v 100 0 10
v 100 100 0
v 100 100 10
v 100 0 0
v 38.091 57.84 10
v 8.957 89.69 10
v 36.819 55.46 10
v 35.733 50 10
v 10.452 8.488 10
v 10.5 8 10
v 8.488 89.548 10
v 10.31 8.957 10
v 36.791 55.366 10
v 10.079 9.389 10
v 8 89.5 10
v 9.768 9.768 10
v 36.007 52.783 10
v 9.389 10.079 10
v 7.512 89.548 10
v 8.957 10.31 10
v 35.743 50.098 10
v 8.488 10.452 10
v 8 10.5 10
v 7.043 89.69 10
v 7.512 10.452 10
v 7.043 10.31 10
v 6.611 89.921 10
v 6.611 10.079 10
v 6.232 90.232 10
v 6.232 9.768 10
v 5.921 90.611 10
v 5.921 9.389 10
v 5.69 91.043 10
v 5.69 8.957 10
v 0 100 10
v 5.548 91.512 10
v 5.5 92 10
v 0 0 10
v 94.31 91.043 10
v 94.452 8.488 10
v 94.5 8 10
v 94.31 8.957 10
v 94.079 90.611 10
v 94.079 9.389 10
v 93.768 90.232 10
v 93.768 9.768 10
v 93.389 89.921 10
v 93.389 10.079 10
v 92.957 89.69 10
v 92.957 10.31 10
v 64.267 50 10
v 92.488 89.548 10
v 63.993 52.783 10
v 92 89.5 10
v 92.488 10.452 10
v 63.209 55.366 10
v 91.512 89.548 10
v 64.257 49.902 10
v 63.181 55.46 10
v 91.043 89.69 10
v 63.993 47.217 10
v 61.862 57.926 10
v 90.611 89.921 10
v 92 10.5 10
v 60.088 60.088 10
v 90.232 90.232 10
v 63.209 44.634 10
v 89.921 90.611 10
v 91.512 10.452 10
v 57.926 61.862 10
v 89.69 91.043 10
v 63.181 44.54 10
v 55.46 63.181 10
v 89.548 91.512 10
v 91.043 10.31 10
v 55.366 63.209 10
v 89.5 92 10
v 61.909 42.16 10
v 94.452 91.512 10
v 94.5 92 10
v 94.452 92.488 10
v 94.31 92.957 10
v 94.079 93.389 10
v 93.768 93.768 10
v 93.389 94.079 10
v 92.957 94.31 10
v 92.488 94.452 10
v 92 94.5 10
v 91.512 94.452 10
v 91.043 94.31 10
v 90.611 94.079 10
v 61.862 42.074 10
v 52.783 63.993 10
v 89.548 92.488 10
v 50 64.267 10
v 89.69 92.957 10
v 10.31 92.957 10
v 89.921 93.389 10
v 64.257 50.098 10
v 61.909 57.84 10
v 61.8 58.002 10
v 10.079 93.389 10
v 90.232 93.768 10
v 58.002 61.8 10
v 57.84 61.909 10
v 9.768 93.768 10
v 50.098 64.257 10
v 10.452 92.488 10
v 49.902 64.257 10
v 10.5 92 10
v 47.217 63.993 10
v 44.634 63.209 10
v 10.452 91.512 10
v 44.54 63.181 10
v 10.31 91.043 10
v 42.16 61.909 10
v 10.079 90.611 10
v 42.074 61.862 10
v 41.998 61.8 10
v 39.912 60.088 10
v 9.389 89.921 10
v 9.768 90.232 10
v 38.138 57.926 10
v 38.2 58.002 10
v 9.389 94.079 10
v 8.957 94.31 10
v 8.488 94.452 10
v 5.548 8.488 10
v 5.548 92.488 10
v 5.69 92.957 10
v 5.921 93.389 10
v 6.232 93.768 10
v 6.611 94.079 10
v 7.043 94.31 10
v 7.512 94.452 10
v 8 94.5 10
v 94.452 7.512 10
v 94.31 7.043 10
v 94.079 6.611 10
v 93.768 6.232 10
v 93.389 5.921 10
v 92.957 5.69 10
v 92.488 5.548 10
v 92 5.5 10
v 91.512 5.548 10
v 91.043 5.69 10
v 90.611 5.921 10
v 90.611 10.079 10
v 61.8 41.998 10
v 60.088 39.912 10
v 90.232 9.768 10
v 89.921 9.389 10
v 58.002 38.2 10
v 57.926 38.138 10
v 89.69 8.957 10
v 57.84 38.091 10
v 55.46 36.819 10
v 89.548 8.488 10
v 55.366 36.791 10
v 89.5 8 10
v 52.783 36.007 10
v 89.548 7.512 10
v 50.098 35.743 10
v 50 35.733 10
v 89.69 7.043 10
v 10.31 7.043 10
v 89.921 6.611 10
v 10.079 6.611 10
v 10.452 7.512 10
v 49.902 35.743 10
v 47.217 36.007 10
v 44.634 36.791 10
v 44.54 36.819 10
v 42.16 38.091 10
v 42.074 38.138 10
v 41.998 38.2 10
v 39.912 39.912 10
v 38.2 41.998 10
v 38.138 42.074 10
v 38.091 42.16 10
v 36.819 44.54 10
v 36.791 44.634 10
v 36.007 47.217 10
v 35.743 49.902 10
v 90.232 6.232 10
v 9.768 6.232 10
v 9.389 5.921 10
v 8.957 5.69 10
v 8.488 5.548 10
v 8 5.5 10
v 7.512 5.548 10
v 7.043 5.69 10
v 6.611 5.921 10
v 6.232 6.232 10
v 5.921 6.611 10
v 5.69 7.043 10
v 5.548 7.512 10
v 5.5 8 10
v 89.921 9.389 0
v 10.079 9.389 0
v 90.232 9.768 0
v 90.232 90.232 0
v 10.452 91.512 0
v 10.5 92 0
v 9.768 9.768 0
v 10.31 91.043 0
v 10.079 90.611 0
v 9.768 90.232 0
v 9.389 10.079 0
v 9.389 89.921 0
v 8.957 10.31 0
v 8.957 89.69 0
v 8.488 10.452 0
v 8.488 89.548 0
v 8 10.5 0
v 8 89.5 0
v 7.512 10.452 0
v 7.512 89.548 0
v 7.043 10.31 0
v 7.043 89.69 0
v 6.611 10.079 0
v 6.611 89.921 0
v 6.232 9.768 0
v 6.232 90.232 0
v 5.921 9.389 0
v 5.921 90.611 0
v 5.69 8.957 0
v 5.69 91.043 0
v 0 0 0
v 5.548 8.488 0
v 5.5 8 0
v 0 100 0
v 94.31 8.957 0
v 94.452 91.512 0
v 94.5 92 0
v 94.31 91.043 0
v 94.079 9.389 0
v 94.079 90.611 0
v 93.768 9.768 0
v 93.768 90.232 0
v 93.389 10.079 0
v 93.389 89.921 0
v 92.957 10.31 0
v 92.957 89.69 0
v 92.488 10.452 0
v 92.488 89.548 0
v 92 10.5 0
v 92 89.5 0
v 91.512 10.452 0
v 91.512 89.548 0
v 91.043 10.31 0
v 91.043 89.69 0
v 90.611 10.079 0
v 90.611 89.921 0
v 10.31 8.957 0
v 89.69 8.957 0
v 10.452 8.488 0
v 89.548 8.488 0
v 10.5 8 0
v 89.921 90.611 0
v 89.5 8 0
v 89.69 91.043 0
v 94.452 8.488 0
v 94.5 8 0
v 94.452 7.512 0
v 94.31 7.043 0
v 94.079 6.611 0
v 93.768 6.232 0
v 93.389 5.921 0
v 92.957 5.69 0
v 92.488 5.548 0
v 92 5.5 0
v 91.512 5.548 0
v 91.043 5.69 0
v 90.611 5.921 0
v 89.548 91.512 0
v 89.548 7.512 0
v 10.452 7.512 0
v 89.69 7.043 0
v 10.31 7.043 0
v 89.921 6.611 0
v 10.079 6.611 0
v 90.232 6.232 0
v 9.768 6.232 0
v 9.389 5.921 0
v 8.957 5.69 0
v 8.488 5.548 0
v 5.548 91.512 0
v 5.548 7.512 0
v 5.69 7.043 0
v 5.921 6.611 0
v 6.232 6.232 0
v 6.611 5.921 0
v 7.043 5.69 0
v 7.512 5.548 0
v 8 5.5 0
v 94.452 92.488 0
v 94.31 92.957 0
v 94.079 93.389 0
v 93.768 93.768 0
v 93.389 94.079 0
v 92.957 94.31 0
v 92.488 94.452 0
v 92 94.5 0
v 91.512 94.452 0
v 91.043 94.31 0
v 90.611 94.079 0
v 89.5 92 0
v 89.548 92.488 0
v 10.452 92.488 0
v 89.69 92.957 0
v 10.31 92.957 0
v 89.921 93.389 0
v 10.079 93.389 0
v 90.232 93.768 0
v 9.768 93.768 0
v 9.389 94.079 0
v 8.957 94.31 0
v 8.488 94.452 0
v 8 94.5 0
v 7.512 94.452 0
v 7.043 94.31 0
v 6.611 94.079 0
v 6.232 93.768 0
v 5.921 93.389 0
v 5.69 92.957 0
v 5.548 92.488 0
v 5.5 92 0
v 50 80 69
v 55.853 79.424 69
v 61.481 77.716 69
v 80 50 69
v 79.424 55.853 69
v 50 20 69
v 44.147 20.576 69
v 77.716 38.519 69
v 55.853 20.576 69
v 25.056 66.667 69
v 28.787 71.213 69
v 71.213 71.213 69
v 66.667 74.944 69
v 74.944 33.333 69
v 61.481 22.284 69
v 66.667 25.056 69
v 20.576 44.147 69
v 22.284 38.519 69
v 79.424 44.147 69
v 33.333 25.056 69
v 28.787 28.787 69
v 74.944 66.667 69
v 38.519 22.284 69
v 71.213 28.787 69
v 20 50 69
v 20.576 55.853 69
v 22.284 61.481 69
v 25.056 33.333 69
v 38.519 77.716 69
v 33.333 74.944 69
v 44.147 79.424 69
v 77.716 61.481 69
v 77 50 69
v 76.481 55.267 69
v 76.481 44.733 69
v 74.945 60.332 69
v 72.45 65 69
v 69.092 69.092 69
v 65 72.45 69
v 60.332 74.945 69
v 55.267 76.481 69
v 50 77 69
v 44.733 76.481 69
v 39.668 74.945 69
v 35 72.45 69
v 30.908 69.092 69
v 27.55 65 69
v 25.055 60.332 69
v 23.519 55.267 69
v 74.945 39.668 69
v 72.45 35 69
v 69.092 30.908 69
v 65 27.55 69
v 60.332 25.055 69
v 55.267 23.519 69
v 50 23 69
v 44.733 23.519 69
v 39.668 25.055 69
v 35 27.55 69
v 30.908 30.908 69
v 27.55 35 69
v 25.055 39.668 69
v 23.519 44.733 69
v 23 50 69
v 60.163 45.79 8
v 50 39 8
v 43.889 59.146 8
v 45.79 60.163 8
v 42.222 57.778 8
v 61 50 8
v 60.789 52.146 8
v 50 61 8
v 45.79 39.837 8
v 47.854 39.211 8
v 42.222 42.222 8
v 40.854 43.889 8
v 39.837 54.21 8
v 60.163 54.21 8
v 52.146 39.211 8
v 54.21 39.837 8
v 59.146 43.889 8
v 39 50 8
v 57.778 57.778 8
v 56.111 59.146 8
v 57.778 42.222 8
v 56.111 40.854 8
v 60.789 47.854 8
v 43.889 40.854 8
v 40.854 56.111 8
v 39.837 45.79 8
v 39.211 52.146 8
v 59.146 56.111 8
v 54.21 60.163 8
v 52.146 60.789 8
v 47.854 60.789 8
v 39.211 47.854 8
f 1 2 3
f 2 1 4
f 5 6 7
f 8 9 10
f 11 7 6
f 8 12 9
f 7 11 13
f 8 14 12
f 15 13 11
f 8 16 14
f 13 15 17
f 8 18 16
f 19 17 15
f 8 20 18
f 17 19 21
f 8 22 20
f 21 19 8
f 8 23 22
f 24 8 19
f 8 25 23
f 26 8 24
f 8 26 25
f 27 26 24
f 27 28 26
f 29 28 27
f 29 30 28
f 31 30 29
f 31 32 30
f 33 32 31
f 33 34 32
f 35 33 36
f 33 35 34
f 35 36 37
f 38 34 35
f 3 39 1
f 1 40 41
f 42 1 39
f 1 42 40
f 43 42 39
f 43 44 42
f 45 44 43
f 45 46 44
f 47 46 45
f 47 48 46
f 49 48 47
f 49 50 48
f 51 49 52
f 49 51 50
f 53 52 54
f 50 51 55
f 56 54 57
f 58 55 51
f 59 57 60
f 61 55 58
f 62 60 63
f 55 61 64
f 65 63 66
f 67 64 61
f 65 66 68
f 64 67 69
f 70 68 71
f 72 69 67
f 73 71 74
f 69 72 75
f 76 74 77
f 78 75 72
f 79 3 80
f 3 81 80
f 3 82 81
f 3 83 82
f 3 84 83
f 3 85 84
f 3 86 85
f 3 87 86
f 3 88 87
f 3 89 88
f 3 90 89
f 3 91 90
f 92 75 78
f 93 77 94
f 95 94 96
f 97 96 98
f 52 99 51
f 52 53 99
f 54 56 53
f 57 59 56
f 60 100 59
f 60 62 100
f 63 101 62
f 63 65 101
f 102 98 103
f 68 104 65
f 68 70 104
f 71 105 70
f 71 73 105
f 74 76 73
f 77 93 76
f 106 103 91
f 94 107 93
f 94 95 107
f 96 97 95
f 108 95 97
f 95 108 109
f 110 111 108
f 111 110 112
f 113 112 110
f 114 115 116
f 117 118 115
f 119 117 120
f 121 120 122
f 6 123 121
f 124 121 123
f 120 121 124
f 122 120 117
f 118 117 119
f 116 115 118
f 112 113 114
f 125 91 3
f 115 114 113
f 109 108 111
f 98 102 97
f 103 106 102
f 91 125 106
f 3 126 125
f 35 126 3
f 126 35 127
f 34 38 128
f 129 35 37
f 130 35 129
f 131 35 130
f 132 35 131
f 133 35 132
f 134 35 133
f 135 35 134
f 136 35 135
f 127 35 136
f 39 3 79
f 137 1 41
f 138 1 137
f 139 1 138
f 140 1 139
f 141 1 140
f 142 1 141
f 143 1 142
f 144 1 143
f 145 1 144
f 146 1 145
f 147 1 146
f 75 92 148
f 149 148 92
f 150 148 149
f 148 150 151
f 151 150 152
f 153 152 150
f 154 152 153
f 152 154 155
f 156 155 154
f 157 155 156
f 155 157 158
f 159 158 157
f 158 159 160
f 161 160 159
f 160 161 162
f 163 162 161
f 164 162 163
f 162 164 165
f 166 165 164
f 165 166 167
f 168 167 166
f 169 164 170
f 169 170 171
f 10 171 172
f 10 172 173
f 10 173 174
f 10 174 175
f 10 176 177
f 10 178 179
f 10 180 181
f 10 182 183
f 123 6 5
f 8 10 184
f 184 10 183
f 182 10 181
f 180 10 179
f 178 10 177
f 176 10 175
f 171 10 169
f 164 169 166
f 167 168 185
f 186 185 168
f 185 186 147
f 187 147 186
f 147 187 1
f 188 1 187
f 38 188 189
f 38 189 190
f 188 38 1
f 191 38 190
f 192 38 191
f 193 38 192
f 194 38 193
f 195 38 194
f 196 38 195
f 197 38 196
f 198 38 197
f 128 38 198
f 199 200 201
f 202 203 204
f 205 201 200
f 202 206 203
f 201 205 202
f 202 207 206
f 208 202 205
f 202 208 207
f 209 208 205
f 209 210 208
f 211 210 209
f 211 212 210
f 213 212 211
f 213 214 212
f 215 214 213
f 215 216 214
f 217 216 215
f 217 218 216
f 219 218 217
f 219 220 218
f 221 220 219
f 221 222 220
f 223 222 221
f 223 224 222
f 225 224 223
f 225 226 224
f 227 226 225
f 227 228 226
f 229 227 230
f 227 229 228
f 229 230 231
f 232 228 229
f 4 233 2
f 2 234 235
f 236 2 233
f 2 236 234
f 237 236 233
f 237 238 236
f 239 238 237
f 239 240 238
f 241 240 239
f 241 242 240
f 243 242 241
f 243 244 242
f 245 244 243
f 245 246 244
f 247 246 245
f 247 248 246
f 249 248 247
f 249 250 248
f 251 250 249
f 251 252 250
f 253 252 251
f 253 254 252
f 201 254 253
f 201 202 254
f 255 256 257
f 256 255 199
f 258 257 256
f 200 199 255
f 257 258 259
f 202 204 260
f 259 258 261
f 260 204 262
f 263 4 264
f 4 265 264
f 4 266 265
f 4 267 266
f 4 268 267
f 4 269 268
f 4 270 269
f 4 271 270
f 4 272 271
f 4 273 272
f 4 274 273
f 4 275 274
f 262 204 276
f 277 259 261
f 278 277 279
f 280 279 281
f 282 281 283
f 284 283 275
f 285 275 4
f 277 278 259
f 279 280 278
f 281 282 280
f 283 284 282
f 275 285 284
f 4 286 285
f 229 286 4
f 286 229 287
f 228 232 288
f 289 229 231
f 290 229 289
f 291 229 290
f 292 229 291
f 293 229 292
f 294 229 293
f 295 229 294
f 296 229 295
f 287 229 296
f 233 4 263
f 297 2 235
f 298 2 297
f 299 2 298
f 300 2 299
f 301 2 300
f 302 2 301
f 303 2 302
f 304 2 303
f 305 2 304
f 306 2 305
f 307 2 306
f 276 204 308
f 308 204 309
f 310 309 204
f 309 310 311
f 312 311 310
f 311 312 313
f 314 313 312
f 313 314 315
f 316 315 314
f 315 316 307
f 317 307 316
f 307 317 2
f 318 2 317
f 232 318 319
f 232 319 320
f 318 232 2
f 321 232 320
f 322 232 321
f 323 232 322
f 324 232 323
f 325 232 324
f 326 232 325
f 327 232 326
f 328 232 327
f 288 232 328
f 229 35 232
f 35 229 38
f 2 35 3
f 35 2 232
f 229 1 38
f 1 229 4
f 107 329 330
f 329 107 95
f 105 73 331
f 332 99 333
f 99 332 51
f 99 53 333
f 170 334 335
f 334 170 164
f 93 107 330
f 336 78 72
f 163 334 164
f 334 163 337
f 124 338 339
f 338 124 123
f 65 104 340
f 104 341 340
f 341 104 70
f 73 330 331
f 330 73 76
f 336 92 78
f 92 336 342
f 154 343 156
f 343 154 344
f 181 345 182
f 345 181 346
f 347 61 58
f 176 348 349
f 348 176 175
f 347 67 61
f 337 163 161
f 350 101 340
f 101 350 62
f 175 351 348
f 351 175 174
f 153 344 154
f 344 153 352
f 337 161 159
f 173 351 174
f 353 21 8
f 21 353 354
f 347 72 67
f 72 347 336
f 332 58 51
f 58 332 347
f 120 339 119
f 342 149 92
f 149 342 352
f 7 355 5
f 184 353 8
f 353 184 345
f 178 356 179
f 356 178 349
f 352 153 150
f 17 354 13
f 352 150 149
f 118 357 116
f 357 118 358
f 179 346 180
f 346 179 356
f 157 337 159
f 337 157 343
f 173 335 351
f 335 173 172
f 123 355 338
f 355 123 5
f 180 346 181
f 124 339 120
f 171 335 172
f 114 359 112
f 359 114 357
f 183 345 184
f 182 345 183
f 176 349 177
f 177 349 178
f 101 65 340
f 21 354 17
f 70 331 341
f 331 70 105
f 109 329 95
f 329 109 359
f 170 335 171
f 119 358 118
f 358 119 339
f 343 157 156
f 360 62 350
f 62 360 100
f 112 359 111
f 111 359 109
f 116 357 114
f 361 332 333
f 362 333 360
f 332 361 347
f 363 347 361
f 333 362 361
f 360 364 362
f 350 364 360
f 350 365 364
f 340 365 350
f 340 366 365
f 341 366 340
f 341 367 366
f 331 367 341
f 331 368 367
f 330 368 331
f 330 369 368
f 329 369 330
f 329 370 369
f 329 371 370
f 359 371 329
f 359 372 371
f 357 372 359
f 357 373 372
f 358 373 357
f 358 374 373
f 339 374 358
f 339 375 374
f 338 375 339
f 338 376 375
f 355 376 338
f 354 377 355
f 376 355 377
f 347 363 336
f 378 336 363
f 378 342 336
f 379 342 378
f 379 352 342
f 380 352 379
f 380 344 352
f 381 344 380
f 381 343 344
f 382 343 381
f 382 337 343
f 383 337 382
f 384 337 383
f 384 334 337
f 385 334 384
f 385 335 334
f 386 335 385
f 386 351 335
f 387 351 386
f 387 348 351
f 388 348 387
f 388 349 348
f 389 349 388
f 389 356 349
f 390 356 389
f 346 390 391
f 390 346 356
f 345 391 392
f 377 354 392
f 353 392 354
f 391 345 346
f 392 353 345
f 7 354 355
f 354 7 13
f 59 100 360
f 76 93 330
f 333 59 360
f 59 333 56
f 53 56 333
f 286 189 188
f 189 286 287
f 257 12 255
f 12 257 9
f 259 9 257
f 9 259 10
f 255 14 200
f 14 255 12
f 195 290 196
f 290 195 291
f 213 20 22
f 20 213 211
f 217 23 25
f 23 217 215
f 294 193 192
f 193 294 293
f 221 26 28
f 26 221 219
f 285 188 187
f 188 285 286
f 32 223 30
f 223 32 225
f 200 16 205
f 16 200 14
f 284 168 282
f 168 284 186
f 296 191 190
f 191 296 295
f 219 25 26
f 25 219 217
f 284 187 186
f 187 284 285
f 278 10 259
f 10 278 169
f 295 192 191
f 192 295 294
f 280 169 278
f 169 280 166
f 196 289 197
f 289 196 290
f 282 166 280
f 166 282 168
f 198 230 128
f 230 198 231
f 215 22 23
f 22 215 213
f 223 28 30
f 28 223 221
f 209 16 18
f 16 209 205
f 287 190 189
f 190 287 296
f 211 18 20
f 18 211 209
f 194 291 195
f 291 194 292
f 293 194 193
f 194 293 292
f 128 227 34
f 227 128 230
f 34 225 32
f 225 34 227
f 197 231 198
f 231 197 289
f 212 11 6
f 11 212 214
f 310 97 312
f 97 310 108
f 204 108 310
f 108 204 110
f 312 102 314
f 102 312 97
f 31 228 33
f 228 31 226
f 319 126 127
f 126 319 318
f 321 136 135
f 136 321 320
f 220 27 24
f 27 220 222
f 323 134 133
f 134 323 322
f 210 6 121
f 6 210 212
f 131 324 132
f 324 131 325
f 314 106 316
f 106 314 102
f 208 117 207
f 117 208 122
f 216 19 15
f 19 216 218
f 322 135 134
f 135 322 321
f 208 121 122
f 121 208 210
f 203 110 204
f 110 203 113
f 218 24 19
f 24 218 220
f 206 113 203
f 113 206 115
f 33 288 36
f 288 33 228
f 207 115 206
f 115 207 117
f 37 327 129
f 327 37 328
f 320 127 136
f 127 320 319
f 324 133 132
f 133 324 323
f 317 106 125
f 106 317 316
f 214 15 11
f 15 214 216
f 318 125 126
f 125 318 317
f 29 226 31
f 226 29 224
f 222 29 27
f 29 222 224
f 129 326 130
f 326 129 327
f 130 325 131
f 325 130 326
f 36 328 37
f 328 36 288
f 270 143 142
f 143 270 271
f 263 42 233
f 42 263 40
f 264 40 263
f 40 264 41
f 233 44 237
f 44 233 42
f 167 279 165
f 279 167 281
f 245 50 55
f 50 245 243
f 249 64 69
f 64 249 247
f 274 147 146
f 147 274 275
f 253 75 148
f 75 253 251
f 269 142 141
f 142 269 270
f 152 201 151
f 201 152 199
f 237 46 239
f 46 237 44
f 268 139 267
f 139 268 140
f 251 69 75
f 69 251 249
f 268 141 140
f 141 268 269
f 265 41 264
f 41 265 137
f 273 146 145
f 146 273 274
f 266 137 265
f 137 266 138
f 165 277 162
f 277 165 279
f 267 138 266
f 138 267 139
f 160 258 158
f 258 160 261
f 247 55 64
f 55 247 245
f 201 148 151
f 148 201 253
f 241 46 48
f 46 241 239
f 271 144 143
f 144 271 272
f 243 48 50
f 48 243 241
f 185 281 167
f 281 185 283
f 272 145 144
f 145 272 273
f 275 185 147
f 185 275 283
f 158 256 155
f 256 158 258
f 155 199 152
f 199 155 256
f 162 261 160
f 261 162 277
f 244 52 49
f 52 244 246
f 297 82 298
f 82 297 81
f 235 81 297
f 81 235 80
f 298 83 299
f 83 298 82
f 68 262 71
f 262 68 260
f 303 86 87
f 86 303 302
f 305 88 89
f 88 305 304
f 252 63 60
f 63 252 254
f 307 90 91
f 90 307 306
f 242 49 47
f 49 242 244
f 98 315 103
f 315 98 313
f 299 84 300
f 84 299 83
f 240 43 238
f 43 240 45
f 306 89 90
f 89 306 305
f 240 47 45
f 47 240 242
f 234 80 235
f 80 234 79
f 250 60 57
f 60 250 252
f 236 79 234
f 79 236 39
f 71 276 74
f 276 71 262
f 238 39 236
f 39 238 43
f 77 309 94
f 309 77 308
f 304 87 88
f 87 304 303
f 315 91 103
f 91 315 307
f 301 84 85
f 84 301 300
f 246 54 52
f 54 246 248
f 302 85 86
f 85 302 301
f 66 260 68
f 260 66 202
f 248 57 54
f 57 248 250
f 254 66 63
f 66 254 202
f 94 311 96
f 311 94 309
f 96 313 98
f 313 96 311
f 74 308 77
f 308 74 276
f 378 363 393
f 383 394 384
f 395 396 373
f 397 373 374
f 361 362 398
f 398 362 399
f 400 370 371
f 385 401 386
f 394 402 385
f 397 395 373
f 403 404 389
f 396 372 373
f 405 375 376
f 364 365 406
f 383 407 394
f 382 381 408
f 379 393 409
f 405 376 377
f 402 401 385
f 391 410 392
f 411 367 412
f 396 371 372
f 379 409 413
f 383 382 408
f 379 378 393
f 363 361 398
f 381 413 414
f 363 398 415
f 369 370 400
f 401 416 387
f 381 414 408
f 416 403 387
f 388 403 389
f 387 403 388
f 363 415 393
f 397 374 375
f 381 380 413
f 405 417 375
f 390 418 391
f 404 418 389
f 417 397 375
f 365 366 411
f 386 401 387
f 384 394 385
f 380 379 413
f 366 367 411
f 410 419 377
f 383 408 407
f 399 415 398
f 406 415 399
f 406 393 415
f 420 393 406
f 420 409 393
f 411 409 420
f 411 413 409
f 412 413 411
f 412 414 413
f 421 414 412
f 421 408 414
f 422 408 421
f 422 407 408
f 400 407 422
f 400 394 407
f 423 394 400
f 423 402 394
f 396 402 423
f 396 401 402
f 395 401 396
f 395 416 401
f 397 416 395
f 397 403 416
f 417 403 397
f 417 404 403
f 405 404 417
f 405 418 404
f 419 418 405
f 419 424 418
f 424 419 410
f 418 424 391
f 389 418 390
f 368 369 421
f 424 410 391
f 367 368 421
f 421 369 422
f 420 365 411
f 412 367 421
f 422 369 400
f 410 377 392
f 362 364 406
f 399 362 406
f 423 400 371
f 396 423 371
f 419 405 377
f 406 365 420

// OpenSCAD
$fn = 32;

// ----------------------------------------------------------------------
// Hopper: flanged with square flange
// ----------------------------------------------------------------------

// --- parameters (mm) ---
fl = 100;                 // flange side, X and Y
fl_t = 10;                // flange thickness
cone_h = 60;              // cone height above the flange
top_d = 60;               // cone mouth diameter
bot_d = 28;               // cone spout diameter
wall = 3;                 // cone wall thickness
hole_r = 2.5;             // flange hole radius
hole_in = 8;              // hole inset from the corners

bore_d = bot_d - 2 * wall;  // spout bore diameter
total_h = fl_t + cone_h - 1;  // overall height

difference() {
  union() {
    cube([fl, fl, fl_t]);
    translate([fl / 2, fl / 2, fl_t - 1])
      cylinder(h = cone_h, d1 = bot_d, d2 = top_d);
  }
  translate([fl / 2, fl / 2, fl_t - 2])
    cylinder(h = cone_h + 1, d1 = bore_d, d2 = top_d - 2 * wall);
  for (sx = [0, 1], sy = [0, 1])
    translate([sx ? fl - hole_in : hole_in,
               sy ? fl - hole_in : hole_in, -1])
      cylinder(r = hole_r, h = fl_t + 2);
}
